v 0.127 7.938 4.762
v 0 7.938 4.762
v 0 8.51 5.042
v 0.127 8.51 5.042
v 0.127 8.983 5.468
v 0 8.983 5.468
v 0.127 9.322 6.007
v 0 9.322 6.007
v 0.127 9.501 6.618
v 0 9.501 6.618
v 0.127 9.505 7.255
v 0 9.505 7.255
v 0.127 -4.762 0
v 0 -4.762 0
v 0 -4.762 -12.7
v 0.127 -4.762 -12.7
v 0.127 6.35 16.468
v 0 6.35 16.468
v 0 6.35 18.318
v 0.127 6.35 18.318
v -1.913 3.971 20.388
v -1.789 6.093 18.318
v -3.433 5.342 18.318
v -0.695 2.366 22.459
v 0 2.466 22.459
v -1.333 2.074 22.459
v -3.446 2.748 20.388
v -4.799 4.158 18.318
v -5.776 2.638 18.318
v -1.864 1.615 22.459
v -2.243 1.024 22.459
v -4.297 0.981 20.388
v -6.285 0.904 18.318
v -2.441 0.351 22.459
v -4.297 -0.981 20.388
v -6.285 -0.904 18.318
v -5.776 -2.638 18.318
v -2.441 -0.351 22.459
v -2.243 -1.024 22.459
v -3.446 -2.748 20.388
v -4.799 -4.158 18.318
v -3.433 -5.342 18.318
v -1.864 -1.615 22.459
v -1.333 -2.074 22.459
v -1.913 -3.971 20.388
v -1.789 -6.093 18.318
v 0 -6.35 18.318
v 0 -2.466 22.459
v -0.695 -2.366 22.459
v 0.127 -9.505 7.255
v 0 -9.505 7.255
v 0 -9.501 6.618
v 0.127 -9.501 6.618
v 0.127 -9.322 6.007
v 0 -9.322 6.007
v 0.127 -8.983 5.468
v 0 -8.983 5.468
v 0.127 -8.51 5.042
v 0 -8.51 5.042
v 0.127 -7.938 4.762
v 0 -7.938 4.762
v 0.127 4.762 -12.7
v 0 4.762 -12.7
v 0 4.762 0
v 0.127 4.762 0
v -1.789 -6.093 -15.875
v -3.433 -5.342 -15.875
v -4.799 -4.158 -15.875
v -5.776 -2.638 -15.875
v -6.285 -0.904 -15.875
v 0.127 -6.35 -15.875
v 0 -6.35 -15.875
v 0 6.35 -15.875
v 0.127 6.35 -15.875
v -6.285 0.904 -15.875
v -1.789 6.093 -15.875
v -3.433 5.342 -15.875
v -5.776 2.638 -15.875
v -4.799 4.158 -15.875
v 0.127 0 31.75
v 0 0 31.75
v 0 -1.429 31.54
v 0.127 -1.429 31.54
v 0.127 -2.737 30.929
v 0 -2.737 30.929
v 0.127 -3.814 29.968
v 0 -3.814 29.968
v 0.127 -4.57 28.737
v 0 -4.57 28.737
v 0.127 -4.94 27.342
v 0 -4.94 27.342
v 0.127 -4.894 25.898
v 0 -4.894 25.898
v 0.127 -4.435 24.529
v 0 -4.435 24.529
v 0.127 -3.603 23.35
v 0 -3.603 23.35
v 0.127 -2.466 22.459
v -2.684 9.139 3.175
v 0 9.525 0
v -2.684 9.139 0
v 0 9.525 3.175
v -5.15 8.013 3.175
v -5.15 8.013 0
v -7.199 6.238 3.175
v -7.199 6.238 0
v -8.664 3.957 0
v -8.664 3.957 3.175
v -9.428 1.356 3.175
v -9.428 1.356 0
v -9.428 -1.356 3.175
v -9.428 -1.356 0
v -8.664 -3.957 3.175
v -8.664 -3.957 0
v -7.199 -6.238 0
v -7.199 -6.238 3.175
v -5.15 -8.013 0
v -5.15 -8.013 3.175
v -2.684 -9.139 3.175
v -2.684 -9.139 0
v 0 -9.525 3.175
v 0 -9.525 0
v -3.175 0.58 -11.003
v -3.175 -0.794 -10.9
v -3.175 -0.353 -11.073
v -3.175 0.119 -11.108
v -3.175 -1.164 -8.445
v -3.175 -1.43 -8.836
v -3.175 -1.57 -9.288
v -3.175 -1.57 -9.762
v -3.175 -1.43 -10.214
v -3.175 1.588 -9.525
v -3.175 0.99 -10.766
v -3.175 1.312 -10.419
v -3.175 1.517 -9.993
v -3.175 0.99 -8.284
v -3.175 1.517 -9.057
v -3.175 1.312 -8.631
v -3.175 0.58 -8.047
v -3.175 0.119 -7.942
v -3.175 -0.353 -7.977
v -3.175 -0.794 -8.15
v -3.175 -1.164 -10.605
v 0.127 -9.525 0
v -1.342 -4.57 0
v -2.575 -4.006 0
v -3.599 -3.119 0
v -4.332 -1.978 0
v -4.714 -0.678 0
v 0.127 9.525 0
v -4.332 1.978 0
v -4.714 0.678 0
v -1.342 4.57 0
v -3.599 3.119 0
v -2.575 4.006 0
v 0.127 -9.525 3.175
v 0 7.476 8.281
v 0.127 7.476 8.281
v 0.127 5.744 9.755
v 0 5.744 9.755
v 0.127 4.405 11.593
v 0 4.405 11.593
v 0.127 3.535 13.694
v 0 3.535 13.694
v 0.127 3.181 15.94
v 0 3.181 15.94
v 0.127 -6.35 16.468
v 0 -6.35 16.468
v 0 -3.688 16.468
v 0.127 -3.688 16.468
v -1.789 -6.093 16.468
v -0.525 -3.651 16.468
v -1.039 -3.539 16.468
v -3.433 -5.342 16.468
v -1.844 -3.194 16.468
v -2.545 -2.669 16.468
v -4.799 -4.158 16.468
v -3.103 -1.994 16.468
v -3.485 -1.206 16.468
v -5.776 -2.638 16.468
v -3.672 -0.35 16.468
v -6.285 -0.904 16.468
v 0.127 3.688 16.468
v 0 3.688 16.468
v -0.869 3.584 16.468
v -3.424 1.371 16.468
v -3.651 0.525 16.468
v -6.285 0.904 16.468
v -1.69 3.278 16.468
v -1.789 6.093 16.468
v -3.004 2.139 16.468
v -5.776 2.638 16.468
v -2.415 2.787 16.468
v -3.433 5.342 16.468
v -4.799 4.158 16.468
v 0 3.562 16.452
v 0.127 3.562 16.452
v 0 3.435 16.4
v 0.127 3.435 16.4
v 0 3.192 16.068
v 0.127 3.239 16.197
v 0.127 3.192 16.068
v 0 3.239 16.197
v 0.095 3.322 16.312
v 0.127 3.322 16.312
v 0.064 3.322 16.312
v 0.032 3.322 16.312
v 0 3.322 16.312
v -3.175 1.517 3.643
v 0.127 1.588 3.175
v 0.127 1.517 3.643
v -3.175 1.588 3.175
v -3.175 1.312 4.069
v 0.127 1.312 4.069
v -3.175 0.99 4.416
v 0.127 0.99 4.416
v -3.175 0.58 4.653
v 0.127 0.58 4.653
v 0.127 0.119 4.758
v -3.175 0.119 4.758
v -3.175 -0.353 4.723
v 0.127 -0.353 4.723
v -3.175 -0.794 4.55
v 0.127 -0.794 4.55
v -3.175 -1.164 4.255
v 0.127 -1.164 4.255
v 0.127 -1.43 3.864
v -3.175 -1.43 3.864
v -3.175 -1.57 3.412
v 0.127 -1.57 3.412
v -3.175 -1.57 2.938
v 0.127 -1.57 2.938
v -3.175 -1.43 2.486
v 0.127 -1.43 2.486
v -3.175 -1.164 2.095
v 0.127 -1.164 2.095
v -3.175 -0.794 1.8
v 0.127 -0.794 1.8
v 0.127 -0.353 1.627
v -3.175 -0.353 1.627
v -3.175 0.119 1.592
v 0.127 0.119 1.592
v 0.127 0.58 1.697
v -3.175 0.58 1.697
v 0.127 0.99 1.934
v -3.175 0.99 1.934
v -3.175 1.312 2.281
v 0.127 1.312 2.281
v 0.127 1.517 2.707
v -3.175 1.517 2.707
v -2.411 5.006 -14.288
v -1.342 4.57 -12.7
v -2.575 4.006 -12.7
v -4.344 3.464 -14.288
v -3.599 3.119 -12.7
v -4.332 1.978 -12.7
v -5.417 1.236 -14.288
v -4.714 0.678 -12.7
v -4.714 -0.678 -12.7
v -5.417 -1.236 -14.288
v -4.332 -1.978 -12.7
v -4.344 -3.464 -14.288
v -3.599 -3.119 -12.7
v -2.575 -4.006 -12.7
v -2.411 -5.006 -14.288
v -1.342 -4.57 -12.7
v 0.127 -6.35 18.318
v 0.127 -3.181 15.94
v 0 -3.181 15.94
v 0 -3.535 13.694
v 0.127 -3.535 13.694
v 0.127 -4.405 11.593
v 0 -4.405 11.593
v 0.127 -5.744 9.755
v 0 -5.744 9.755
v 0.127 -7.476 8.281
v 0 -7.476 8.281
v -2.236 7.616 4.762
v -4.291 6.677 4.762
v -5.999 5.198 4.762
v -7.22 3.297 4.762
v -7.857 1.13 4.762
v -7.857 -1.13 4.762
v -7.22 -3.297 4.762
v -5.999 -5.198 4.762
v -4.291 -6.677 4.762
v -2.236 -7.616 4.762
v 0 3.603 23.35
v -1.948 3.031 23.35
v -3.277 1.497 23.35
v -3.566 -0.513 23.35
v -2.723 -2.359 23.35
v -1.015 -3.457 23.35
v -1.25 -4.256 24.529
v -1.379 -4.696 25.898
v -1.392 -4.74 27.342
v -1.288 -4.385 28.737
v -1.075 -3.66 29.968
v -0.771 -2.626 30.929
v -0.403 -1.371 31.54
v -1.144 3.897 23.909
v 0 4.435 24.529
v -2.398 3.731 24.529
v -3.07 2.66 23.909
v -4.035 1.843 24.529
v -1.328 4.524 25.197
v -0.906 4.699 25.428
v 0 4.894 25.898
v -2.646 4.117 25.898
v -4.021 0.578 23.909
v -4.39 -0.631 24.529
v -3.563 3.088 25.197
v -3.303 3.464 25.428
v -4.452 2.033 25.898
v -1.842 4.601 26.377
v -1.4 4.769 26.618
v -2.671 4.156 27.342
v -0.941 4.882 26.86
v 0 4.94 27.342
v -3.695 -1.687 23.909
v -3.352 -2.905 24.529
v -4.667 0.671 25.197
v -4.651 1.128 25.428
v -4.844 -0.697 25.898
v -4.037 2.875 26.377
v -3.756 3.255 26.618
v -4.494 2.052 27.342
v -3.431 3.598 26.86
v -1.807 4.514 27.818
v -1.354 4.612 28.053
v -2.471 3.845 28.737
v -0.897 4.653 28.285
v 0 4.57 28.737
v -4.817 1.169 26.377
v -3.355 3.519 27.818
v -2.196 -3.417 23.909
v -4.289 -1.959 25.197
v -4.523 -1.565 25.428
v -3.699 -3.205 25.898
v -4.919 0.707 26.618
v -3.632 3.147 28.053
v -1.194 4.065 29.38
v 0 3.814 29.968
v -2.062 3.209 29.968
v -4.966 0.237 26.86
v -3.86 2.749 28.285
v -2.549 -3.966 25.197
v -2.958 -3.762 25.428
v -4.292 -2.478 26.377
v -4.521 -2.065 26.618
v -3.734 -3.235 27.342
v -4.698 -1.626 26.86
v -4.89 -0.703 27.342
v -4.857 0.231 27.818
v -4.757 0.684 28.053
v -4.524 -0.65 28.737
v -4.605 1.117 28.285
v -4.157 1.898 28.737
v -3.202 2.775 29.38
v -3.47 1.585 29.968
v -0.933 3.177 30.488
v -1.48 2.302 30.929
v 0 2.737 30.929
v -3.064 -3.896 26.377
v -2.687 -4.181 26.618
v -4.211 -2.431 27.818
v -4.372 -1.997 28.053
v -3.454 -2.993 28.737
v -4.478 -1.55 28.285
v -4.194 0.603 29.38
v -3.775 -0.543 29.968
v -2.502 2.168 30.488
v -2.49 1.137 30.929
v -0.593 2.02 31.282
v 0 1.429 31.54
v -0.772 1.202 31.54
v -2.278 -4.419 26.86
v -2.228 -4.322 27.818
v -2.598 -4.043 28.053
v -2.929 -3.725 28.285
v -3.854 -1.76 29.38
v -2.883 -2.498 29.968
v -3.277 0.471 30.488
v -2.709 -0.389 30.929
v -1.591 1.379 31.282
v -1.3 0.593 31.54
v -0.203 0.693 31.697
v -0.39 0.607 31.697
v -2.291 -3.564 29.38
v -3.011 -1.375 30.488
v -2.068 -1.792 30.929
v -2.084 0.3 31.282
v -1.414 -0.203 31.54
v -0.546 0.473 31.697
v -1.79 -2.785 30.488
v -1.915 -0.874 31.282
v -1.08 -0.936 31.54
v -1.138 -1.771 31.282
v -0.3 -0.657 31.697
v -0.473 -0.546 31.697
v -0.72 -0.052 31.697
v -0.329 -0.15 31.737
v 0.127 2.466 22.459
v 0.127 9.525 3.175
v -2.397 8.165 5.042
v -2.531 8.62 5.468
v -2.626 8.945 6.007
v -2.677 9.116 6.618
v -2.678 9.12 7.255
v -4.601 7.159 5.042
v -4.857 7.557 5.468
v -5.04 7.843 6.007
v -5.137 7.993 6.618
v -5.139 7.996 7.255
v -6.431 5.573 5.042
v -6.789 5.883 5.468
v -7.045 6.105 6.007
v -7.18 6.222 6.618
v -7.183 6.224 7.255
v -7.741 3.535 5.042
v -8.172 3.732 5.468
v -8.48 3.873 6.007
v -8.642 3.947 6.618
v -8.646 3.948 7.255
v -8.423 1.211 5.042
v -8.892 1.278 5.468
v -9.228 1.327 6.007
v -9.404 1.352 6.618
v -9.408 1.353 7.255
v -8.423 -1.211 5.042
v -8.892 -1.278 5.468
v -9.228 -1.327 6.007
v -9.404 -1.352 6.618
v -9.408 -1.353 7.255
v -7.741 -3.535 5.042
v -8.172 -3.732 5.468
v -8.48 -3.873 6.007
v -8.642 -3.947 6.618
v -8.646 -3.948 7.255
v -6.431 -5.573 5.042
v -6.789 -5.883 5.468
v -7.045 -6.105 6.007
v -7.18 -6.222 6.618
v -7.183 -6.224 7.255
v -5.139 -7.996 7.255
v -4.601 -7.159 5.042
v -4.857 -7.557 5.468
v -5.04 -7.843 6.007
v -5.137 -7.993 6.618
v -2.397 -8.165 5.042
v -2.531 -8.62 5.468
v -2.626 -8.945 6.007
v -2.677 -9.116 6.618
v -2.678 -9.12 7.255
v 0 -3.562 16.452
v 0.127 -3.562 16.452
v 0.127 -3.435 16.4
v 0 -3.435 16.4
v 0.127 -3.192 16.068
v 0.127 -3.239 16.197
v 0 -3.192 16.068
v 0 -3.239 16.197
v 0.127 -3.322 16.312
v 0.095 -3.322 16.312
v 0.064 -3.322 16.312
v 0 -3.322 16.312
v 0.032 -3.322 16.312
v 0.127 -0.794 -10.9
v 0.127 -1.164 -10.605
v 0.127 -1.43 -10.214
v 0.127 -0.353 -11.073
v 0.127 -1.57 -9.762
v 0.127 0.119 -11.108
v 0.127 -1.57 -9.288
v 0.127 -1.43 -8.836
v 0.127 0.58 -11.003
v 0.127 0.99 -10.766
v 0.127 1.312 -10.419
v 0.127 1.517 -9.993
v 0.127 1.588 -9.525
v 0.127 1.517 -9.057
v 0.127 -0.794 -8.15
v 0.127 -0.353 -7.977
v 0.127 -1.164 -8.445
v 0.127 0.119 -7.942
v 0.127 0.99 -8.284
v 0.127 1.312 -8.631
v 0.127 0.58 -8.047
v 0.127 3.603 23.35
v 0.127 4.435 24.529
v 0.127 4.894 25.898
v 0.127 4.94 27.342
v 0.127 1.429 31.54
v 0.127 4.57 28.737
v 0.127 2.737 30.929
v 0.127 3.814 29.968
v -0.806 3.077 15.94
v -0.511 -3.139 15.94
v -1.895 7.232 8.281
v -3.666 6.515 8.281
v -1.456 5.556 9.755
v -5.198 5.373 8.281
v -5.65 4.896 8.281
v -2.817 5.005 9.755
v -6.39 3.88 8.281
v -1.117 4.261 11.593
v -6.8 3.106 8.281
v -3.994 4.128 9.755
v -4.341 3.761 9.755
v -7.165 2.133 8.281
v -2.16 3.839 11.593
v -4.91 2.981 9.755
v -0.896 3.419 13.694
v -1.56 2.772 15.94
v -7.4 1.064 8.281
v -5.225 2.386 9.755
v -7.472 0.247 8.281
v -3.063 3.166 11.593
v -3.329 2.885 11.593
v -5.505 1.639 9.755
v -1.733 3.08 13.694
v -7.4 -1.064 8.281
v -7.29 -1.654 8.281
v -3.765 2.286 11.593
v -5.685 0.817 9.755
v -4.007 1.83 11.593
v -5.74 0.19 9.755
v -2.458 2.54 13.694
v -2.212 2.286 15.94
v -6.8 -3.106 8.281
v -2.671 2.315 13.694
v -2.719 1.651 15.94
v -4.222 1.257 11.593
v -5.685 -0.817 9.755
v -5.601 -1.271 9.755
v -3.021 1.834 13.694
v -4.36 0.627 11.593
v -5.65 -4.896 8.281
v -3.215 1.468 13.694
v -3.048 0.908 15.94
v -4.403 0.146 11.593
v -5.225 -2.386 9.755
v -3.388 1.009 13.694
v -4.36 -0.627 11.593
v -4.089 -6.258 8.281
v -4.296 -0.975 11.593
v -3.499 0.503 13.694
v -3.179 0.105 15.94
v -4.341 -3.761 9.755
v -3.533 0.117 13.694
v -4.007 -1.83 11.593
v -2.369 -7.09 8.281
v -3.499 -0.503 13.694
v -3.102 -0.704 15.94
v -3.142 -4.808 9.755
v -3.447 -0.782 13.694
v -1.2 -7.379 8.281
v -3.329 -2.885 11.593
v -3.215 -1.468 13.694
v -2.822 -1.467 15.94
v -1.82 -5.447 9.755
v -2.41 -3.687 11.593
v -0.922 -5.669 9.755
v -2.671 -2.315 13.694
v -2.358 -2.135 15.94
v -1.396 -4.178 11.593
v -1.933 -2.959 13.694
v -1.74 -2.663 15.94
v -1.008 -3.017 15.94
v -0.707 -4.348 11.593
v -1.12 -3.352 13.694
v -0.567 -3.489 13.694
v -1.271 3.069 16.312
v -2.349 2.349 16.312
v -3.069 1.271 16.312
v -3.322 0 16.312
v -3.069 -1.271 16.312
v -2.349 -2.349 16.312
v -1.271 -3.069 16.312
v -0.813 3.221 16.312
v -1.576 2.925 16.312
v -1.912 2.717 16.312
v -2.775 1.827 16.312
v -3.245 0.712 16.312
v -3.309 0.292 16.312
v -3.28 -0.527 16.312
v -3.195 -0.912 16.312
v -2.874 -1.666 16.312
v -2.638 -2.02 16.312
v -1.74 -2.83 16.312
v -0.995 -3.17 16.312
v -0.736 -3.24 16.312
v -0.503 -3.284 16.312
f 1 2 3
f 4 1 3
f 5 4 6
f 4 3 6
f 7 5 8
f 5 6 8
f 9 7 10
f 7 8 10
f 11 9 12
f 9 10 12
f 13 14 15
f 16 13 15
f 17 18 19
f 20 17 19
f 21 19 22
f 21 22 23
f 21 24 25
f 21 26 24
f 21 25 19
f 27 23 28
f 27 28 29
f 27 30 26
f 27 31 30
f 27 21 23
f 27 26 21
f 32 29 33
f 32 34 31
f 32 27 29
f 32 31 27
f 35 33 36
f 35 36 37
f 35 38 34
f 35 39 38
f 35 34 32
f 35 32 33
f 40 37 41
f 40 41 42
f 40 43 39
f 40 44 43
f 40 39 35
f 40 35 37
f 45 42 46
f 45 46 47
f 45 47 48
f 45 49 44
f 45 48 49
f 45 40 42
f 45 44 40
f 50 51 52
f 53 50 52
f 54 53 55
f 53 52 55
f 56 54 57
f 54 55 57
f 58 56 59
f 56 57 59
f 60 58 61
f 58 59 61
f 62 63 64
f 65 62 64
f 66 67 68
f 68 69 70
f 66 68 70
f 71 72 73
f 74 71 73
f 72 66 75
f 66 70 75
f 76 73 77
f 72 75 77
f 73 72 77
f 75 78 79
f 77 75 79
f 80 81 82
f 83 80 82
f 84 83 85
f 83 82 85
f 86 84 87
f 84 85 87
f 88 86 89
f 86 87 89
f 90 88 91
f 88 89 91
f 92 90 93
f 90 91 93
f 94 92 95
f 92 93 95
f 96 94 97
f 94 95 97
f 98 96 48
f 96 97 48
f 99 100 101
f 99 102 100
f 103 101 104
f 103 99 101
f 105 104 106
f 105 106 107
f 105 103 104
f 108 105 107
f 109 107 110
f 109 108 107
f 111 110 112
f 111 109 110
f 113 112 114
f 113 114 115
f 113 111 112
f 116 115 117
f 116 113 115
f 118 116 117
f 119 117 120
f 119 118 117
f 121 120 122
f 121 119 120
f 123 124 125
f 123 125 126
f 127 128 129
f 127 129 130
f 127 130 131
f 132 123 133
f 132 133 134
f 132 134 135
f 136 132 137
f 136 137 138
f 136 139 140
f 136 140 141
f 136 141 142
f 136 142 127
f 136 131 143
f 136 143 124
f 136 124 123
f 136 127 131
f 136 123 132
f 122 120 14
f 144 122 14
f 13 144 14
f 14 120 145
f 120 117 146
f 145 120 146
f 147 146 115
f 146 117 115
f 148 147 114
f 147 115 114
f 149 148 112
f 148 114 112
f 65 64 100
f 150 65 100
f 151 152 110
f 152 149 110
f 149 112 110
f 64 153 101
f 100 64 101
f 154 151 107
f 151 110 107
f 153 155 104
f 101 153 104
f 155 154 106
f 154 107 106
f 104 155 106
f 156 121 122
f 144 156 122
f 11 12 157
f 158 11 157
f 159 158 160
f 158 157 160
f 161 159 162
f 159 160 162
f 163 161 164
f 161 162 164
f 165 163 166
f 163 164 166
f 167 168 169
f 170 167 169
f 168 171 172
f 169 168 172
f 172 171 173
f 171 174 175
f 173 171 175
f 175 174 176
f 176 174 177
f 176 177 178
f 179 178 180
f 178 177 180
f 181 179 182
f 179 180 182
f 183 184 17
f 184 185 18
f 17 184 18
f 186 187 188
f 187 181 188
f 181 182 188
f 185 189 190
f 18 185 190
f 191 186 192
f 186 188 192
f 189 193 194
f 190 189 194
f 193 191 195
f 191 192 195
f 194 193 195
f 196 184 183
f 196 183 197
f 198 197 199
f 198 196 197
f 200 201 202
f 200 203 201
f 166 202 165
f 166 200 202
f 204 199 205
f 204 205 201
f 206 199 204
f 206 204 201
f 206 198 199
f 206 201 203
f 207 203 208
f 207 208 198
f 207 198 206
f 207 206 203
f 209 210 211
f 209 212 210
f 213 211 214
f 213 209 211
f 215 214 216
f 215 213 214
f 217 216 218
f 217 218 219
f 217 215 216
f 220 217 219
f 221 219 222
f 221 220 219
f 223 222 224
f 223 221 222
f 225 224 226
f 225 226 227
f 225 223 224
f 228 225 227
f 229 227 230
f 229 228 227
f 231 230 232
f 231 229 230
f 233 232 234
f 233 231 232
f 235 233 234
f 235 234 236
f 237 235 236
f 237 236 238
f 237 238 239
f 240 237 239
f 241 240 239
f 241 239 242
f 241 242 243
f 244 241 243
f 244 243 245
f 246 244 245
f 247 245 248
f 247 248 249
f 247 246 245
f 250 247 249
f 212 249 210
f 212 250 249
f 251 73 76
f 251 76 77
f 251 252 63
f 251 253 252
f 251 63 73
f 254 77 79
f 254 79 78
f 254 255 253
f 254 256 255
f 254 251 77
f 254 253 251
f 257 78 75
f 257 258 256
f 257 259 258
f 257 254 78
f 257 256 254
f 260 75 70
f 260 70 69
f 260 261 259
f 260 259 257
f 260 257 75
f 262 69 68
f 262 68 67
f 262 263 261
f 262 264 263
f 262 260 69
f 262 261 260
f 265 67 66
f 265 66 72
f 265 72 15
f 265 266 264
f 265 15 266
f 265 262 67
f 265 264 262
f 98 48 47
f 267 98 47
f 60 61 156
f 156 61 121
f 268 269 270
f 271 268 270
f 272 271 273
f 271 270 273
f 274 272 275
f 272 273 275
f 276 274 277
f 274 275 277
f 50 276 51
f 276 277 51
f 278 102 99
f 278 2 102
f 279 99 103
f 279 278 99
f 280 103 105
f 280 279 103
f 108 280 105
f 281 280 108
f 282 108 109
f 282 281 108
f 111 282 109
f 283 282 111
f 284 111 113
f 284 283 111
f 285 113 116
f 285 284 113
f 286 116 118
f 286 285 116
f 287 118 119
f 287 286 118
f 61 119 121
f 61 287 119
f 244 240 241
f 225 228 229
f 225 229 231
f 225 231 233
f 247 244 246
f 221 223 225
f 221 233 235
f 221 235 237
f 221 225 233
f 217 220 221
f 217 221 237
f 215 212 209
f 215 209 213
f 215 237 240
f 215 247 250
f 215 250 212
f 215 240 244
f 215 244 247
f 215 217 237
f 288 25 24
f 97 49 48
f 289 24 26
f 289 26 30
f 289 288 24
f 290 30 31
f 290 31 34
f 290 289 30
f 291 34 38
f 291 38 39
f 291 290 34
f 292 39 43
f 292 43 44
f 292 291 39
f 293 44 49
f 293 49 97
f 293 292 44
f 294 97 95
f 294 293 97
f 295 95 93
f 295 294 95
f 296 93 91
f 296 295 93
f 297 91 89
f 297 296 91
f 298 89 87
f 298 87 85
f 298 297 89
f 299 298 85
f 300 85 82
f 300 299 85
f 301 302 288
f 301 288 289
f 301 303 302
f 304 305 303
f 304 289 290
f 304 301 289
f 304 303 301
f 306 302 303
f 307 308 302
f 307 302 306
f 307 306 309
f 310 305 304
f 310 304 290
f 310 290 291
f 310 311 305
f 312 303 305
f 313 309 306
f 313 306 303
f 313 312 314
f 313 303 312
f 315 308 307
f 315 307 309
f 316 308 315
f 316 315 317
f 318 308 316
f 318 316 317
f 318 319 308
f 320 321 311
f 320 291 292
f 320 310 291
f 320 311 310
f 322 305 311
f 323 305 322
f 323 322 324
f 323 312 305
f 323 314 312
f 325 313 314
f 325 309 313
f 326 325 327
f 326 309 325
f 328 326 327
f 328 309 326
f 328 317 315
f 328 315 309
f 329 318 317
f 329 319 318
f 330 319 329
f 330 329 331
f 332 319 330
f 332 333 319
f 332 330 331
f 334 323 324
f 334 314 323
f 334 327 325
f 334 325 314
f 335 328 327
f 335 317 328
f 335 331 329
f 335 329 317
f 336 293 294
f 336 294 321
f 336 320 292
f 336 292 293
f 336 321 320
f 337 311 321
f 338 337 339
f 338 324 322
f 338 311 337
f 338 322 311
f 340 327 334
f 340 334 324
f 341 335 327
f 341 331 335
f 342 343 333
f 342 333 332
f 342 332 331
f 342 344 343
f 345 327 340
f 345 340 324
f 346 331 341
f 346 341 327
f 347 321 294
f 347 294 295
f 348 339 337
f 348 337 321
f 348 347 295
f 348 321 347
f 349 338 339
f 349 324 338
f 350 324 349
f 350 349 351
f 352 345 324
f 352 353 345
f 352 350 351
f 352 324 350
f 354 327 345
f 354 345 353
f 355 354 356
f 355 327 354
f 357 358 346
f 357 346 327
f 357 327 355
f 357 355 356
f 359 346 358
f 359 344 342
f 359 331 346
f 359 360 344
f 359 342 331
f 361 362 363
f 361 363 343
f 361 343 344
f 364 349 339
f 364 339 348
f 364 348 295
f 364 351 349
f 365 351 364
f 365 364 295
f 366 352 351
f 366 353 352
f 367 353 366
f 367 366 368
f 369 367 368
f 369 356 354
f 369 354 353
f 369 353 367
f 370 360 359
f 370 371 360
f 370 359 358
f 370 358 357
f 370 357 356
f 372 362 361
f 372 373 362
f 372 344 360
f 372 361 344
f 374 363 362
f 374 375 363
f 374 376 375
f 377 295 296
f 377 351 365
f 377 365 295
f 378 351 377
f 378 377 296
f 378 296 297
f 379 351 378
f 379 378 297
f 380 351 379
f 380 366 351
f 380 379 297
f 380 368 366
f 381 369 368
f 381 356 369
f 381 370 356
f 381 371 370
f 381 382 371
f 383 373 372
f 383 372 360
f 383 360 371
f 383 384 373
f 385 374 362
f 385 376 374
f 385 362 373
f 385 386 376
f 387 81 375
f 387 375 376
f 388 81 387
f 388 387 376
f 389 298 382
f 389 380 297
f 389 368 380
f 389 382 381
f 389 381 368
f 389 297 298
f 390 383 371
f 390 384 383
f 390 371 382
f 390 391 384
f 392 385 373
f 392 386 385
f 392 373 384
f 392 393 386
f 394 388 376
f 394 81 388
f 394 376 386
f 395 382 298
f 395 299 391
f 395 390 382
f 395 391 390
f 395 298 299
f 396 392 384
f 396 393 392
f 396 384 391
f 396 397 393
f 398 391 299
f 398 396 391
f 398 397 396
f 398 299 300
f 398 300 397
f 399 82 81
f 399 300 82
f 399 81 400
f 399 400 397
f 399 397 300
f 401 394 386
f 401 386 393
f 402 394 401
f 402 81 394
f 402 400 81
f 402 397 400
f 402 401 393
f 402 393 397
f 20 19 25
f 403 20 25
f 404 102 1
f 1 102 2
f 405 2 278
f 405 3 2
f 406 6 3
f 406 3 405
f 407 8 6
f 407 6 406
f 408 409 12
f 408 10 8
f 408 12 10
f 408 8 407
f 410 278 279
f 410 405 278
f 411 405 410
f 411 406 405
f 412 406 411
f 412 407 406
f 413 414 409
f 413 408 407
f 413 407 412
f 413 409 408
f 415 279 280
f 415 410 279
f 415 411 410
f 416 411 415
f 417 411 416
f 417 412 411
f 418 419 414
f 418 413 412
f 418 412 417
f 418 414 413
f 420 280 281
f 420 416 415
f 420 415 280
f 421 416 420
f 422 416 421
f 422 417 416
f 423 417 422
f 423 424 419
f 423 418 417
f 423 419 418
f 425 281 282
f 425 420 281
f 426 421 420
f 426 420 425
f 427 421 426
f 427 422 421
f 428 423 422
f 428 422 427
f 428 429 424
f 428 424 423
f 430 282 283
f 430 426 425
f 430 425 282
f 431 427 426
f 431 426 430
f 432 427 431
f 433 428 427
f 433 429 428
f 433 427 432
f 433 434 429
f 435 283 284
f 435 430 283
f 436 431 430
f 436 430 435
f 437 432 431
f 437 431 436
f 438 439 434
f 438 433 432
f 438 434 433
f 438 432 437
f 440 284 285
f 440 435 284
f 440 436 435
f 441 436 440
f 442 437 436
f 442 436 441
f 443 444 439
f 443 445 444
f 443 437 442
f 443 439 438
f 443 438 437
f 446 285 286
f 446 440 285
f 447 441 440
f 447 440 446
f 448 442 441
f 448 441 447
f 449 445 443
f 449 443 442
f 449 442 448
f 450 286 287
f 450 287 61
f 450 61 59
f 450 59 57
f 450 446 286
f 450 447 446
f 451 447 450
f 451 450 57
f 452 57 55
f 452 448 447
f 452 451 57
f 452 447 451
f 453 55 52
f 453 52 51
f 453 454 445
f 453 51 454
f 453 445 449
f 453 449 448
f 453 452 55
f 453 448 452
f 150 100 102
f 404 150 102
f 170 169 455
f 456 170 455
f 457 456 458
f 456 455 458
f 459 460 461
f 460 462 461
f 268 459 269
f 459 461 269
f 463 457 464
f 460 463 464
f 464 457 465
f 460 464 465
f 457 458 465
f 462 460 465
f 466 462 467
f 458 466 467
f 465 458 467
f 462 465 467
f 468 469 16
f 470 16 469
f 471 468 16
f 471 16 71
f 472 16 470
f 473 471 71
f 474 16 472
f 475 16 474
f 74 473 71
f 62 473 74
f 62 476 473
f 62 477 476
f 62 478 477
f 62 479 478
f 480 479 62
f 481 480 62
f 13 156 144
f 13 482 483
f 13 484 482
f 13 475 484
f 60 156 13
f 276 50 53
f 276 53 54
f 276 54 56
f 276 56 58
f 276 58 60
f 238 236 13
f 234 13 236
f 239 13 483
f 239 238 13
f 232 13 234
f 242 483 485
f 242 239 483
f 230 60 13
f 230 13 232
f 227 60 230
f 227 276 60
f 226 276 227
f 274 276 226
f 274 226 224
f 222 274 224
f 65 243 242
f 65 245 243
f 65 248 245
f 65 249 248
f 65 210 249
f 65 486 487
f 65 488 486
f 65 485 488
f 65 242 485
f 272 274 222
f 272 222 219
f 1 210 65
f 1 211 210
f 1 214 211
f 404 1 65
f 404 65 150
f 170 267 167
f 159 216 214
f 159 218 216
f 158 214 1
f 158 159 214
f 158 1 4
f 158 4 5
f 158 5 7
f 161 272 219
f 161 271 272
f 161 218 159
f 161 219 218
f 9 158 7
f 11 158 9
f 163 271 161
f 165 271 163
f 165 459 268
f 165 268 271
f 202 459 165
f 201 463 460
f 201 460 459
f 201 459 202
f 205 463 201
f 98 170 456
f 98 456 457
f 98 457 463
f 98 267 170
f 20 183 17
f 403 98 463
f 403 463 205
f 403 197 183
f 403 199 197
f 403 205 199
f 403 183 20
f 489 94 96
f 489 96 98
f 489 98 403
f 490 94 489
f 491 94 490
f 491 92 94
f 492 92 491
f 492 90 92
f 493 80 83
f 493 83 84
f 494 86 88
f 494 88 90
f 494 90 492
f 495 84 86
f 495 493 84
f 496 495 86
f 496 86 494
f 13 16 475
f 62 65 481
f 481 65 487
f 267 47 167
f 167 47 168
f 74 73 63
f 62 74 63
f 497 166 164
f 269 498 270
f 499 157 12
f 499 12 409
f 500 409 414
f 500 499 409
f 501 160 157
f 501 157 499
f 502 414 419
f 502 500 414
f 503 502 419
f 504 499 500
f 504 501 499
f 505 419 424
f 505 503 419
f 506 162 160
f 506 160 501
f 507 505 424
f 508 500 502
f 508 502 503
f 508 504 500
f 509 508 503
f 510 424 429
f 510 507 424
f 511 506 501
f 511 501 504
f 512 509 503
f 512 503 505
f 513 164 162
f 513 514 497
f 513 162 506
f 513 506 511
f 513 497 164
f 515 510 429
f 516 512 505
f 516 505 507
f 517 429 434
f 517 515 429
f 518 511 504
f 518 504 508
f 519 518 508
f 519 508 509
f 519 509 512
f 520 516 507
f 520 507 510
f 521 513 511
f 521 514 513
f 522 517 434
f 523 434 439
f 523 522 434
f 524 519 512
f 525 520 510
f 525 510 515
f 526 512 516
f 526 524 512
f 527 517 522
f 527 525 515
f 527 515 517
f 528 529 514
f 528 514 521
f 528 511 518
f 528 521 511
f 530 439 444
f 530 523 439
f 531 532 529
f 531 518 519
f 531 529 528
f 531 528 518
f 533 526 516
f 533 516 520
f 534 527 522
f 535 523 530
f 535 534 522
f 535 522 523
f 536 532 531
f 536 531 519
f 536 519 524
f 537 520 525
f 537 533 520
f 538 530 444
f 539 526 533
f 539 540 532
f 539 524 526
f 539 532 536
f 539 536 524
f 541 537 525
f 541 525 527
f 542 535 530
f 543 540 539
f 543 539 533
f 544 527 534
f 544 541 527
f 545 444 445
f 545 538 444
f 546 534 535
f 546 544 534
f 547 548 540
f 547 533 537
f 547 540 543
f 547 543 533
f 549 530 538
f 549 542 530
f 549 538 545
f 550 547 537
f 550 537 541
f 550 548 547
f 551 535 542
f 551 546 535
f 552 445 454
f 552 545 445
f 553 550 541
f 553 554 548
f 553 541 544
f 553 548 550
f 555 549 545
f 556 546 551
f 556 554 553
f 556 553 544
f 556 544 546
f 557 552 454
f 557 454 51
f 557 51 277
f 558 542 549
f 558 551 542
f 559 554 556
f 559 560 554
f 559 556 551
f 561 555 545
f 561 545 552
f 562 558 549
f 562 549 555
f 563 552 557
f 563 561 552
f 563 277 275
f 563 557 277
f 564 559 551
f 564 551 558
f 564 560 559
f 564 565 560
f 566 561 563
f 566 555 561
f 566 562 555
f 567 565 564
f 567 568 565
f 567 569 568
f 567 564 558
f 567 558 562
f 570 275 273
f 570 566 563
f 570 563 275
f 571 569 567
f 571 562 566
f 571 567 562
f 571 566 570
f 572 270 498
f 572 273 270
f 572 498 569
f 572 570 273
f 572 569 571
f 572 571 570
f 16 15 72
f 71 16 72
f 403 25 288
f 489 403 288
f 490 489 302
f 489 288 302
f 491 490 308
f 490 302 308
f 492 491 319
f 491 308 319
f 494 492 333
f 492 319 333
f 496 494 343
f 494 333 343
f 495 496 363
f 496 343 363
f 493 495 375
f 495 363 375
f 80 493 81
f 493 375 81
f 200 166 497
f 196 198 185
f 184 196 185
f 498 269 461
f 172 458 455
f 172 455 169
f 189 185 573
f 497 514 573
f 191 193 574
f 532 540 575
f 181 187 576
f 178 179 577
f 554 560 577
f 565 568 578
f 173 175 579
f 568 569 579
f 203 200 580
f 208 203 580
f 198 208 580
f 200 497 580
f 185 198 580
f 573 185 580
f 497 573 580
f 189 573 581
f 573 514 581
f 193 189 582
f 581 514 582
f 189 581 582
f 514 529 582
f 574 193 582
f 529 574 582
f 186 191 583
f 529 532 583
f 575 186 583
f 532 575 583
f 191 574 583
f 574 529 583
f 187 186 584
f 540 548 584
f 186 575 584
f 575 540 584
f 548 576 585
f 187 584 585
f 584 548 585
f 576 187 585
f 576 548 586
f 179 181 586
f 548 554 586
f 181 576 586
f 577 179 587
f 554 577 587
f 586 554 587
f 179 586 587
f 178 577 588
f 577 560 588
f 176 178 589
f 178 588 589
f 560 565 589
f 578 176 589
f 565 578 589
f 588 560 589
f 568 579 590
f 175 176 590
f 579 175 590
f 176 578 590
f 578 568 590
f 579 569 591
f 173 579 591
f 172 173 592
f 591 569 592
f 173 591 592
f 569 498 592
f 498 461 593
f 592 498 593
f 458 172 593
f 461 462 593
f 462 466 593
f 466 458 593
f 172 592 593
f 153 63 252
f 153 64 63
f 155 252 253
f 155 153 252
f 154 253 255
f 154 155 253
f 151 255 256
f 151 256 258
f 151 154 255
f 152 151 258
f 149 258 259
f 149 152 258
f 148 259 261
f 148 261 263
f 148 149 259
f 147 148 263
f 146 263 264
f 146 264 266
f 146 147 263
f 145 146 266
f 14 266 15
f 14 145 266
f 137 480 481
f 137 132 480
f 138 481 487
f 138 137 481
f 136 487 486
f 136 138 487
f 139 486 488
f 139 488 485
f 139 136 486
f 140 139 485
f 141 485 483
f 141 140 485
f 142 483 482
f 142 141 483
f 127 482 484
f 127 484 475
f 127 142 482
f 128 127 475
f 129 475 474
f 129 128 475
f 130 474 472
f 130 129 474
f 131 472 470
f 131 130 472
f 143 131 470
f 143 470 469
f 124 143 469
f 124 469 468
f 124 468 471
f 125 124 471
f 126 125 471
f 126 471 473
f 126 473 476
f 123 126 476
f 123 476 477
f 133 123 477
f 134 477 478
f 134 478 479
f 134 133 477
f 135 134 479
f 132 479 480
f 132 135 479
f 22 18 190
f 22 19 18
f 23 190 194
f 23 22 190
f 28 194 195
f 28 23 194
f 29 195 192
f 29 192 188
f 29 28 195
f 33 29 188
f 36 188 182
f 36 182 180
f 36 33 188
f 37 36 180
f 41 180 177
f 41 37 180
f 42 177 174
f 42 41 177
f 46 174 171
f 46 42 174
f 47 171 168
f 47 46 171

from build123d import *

# Parameters (mm, degrees)
F0_W      = 4.7625
F0_H      = 12.7
F1_ANGLE  = 180
F2_R      = 1.5875
F3_DEPTH  = 3.175
F4_R      = 0.508
F1_FACE_R = 1.5875
F5_DEPTH  = 0.127


with BuildPart() as f1:
    # F0 (on Right) → F1 (revolve)
    with BuildSketch(Plane.YZ):
        with BuildLine():
            Line((0, 31.75), (0, 0))
            Line((0, 0), (4.7625, 0))
            Line((4.7625, 0), (9.525, 0))
            Line((9.525, 0), (9.525, 3.175))
            Line((9.525, 3.175), (7.9375, 4.7625))
            ThreePointArc((7.9375, 4.7625), (9.171707, 5.725409), (9.504834, 7.254947))
            ThreePointArc((9.504834, 7.254947), (4.867571, 10.849768), (3.175, 16.467789))
            Line((3.175, 16.467789), (6.35, 16.467789))
            Line((6.35, 16.467789), (6.35, 18.317595))
            Line((6.35, 18.317595), (2.46587, 22.459295))
            ThreePointArc((2.46587, 22.459295), (4.806186, 28.053033), (0, 31.75))
        make_face()
        with Locations((2.38125, -6.35)):
            Rectangle(F0_W, F0_H)
        Polygon((4.7625, -12.7), (0, -12.7), (0, -15.875), (6.35, -15.875), align=None)
    revolve(axis=Axis((0, 0, 15.875), (0, 0, 1)), revolution_arc=F1_ANGLE)

    # F2 (on face) → F3 (cut)
    with BuildSketch(Plane.YZ):
        with Locations((0, 3.175)):
            Circle(F2_R)
        with Locations((0, -9.525)):
            Circle(F2_R)
    extrude(amount=-F3_DEPTH, mode=Mode.SUBTRACT)

    # F4
    f4_edges = [f1.edges().sort_by_distance(p)[0] for p in [
        (-3.175, 0, 16.467789),
    ]]
    fillet(f4_edges, radius=F4_R)

    # F1_face (on face) → F5 (join)
    with BuildSketch(Plane(origin=(0, 0, 6.530127), x_dir=(0, 1, 0), z_dir=(1, 0, 0))):
        with BuildLine():
            Line((3.688236, 9.937662), (6.35, 9.937662))
            Line((6.35, 9.937662), (6.35, 11.787469))
            Line((6.35, 11.787469), (2.46587, 15.929168))
            ThreePointArc((2.46587, 15.929168), (4.806186, 21.522907), (0, 25.219873))
            ThreePointArc((0, 25.219873), (-4.806186, 21.522907), (-2.46587, 15.929168))
            Line((-2.46587, 15.929168), (-6.35, 11.787469))
            Line((-6.35, 11.787469), (-6.35, 9.937662))
            Line((-6.35, 9.937662), (-3.688236, 9.937662))
            add(Edge.make_bspline(
                [(-3.688236, 9.937662), (-3.657727, 9.937662), (-3.626288, 9.935464), (-3.594162, 9.930815), (-3.561678, 9.923496), (-3.529253, 9.913372), (-3.465394, 9.887476), (-3.433961, 9.871702), (-3.40348, 9.85309), (-3.374427, 9.831747), (-3.347244, 9.807928), (-3.297392, 9.756145), (-3.274705, 9.728198), (-3.254541, 9.698489), (-3.237138, 9.667463), (-3.222581, 9.635595), (-3.199016, 9.570815), (-3.190049, 9.537897), (-3.183914, 9.505022), (-3.180455, 9.472607), (-3.17944, 9.440977), (-3.180603, 9.410368)],
                knots=[0, 0, 0, 0, 0, 0, 0, 0.24993, 0.24993, 0.24993, 0.24993, 0.24993, 0.5, 0.5, 0.5, 0.5, 0.5, 0.74907, 0.74907, 0.74907, 0.74907, 0.74907, 1, 1, 1, 1, 1, 1, 1], degree=6))
            ThreePointArc((-3.180603, 9.410368), (-5.019853, 4.104372), (-9.504834, 0.72482))
            ThreePointArc((-9.504834, 0.72482), (-9.171707, -0.804718), (-7.9375, -1.767627))
            Line((-7.9375, -1.767627), (-9.525, -3.355127))
            Line((-9.525, -3.355127), (-9.525, -6.530127))
            Line((-9.525, -6.530127), (-4.7625, -6.530127))
            Line((-4.7625, -6.530127), (-4.7625, -19.230127))
            Line((-4.7625, -19.230127), (-6.35, -22.405127))
            Line((-6.35, -22.405127), (6.35, -22.405127))
            Line((6.35, -22.405127), (4.7625, -19.230127))
            Line((4.7625, -19.230127), (4.7625, -6.530127))
            Line((4.7625, -6.530127), (9.525, -6.530127))
            Line((9.525, -6.530127), (9.525, -3.355127))
            Line((9.525, -3.355127), (7.9375, -1.767627))
            ThreePointArc((7.9375, -1.767627), (9.171707, -0.804718), (9.504834, 0.72482))
            ThreePointArc((9.504834, 0.72482), (5.019853, 4.104372), (3.180603, 9.410368))
            add(Edge.make_bspline(
                [(3.688236, 9.937662), (3.657727, 9.937662), (3.626288, 9.935464), (3.594162, 9.930815), (3.561678, 9.923496), (3.529253, 9.913372), (3.465394, 9.887476), (3.433961, 9.871702), (3.40348, 9.85309), (3.374427, 9.831747), (3.347244, 9.807928), (3.297392, 9.756145), (3.274705, 9.728198), (3.254541, 9.698489), (3.237138, 9.667463), (3.222581, 9.635595), (3.199016, 9.570815), (3.190049, 9.537897), (3.183914, 9.505022), (3.180455, 9.472607), (3.17944, 9.440977), (3.180603, 9.410368)],
                knots=[0, 0, 0, 0, 0, 0, 0, 0.24993, 0.24993, 0.24993, 0.24993, 0.24993, 0.5, 0.5, 0.5, 0.5, 0.5, 0.74907, 0.74907, 0.74907, 0.74907, 0.74907, 1, 1, 1, 1, 1, 1, 1], degree=6))
        make_face()
        with Locations((0, -16.055127)):
            Circle(F1_FACE_R, mode=Mode.SUBTRACT)
        with Locations((0, -3.355127)):
            Circle(F1_FACE_R, mode=Mode.SUBTRACT)
    extrude(amount=F5_DEPTH)


solid = f1.part
